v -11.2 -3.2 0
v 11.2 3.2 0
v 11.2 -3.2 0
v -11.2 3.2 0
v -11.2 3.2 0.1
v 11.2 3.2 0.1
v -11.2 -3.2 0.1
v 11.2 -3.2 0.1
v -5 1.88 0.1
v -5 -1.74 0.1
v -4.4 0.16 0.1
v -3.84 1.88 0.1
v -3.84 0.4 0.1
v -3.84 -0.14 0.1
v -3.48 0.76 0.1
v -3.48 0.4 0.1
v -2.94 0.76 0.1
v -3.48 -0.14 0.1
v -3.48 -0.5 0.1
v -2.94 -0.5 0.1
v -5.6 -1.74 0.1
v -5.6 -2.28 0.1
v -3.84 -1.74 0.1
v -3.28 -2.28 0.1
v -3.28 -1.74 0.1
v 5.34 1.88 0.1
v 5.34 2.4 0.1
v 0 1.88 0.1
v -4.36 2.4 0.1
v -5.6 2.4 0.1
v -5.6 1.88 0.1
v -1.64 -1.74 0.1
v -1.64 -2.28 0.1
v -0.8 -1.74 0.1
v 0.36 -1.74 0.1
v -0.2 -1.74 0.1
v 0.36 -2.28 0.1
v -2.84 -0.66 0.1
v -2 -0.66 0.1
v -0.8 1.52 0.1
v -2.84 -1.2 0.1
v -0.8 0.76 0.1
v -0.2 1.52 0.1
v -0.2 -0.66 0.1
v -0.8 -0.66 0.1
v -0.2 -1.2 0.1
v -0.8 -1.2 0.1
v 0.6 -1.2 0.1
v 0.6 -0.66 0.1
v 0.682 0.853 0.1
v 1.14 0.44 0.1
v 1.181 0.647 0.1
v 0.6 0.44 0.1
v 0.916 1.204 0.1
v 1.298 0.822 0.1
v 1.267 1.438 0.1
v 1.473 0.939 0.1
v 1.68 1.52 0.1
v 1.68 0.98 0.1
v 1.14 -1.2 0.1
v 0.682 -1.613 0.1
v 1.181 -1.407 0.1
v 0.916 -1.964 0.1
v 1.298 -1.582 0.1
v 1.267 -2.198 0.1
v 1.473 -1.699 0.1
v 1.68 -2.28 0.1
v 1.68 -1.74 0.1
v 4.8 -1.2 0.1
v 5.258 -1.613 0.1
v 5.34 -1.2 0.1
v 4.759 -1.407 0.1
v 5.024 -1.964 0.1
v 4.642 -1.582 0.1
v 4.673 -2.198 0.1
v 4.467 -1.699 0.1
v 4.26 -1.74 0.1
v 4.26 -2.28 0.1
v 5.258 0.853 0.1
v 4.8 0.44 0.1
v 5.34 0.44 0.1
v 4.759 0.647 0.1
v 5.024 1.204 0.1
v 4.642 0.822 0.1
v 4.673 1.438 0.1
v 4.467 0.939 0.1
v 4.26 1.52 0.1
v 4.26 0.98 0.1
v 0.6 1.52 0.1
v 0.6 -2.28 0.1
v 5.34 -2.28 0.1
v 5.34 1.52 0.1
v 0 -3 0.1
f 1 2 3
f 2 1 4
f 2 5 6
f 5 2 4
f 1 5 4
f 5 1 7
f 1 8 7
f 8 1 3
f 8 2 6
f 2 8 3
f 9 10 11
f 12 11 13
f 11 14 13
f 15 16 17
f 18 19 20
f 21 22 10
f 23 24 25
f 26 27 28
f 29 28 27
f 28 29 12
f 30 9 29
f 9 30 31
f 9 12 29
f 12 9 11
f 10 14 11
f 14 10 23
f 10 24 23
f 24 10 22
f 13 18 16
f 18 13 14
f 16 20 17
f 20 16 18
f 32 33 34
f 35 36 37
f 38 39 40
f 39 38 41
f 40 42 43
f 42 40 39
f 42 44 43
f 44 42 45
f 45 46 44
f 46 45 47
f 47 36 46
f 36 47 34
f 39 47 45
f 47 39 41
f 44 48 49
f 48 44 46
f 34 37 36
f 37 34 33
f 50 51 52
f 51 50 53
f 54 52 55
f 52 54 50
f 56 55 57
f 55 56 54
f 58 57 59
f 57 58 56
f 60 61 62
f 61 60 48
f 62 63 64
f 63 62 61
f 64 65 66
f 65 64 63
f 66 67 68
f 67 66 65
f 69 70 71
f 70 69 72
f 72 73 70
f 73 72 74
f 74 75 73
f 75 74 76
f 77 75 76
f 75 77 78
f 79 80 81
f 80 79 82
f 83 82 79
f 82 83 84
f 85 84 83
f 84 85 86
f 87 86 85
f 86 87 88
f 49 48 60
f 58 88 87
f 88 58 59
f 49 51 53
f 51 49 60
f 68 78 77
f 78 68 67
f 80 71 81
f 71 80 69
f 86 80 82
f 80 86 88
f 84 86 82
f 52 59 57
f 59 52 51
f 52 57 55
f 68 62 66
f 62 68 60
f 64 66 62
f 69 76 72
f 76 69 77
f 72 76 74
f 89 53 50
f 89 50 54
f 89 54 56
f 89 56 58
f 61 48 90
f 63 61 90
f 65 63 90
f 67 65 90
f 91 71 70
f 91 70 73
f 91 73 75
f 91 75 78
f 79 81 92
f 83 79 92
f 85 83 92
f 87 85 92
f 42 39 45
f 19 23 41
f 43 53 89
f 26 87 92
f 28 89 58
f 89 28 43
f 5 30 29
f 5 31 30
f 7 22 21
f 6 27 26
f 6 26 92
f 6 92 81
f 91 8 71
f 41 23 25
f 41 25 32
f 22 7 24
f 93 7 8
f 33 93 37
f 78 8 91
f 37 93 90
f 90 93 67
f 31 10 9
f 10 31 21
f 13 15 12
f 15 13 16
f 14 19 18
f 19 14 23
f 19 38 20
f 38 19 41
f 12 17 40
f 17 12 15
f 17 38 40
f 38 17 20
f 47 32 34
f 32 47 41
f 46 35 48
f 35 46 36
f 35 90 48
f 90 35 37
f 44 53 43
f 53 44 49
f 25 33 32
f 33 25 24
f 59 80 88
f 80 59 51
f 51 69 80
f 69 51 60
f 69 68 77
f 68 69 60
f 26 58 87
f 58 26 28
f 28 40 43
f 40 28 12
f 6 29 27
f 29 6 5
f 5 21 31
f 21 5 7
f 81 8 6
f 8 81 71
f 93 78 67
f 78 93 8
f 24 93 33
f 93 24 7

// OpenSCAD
// file: ../p/4-4edge.scad
use <../lib.scad>
$fa=1; $fs=0.2;
function ldraw_lib__4_4edge(realsolid=false) = [
// 0 Circle 1.0
// 0 Name: 4-4edge.dat
// 0 Author: James Jessiman
// 0 !LDRAW_ORG Primitive UPDATE 2017-01
// 0 !LICENSE Licensed under CC BY 2.0 and CC BY 4.0 : see CAreadme.txt
// 
// 0 BFC CERTIFY CCW
  [0,"BFC","CERTIFY"],
  [0,"BFC","CCW"],
// 
// 0 !HISTORY 1998-12-15 [PTadmin] Official Update 1998-10
// 0 !HISTORY 2005-12-28 [PTadmin] Official Update 2005-01
// 0 !HISTORY 2007-06-24 [PTadmin] Header formatted for Contributor Agreement
// 0 !HISTORY 2008-07-01 [PTadmin] Official Update 2008-01
// 0 !HISTORY 2017-01-15 [Steffen] BFCed
// 0 !HISTORY 2017-12-30 [PTadmin] Official Update 2017-01
// 
// 
// 2 24 1 0 0 0.9239 0 0.3827
  [2,24,1,0,0,0.9239,0,0.3827],
// 2 24 0.9239 0 0.3827 0.7071 0 0.7071
  [2,24,0.9239,0,0.3827,0.7071,0,0.7071],
// 2 24 0.7071 0 0.7071 0.3827 0 0.9239
  [2,24,0.7071,0,0.7071,0.3827,0,0.9239],
// 2 24 0.3827 0 0.9239 0 0 1
  [2,24,0.3827,0,0.9239,0,0,1],
// 2 24 0 0 1 -0.3827 0 0.9239
  [2,24,0,0,1,-0.3827,0,0.9239],
// 2 24 -0.3827 0 0.9239 -0.7071 0 0.7071
  [2,24,-0.3827,0,0.9239,-0.7071,0,0.7071],
// 2 24 -0.7071 0 0.7071 -0.9239 0 0.3827
  [2,24,-0.7071,0,0.7071,-0.9239,0,0.3827],
// 2 24 -0.9239 0 0.3827 -1 0 -0
  [2,24,-0.9239,0,0.3827,-1,0,-0],
// 2 24 -1 0 -0 -0.9239 0 -0.3827
  [2,24,-1,0,-0,-0.9239,0,-0.3827],
// 2 24 -0.9239 0 -0.3827 -0.7071 0 -0.7071
  [2,24,-0.9239,0,-0.3827,-0.7071,0,-0.7071],
// 2 24 -0.7071 0 -0.7071 -0.3827 0 -0.9239
  [2,24,-0.7071,0,-0.7071,-0.3827,0,-0.9239],
// 2 24 -0.3827 0 -0.9239 0 0 -1
  [2,24,-0.3827,0,-0.9239,0,0,-1],
// 2 24 0 0 -1 0.3827 0 -0.9239
  [2,24,0,0,-1,0.3827,0,-0.9239],
// 2 24 0.3827 0 -0.9239 0.7071 0 -0.7071
  [2,24,0.3827,0,-0.9239,0.7071,0,-0.7071],
// 2 24 0.7071 0 -0.7071 0.9239 0 -0.3827
  [2,24,0.7071,0,-0.7071,0.9239,0,-0.3827],
// 2 24 0.9239 0 -0.3827 1 0 0
  [2,24,0.9239,0,-0.3827,1,0,0],
];
module ldraw_lib__4_4edge(step=0, col=false, unit=2/5, alt=false, line=0.2, solid=!$preview)
    makepoly(ldraw_lib__4_4edge(solid), step=step, col=col, unit=unit, alt=alt, line=line, solid=solid);
ldraw_lib__4_4edge(line=0.2);
// file: ../p/4-4disc.scad
use <../lib.scad>
$fa=1; $fs=0.2;
function ldraw_lib__4_4disc(realsolid=false) = [
// 0 Disc 1.0
// 0 Name: 4-4disc.dat
// 0 Author: James Jessiman
// 0 !LDRAW_ORG Primitive UPDATE 2002-02
// 0 !LICENSE Licensed under CC BY 2.0 and CC BY 4.0 : see CAreadme.txt
// 
// 0 BFC CERTIFY CCW
  [0,"BFC","CERTIFY"],
  [0,"BFC","CCW"],
// 
// 0 !HISTORY 1998-12-15 [PTadmin] Official Update 1998-10
// 0 !HISTORY 2002-03-23 [sbliss] Added BFC statement
// 0 !HISTORY 2002-04-25 [PTadmin] Official Update 2002-02
// 0 !HISTORY 2007-06-24 [PTadmin] Header formatted for Contributor Agreement
// 0 !HISTORY 2008-07-01 [PTadmin] Official Update 2008-01
// 
// 
// 3 16 0 0 0 1 0 0 0.9239 0 0.3827
  [3,16,0,0,0,1,0,0,0.9239,0,0.3827],
// 3 16 0 0 0 0.9239 0 0.3827 0.7071 0 0.7071
  [3,16,0,0,0,0.9239,0,0.3827,0.7071,0,0.7071],
// 3 16 0 0 0 0.7071 0 0.7071 0.3827 0 0.9239
  [3,16,0,0,0,0.7071,0,0.7071,0.3827,0,0.9239],
// 3 16 0 0 0 0.3827 0 0.9239 0 0 1
  [3,16,0,0,0,0.3827,0,0.9239,0,0,1],
// 3 16 0 0 0 0 0 1 -0.3827 0 0.9239
  [3,16,0,0,0,0,0,1,-0.3827,0,0.9239],
// 3 16 0 0 0 -0.3827 0 0.9239 -0.7071 0 0.7071
  [3,16,0,0,0,-0.3827,0,0.9239,-0.7071,0,0.7071],
// 3 16 0 0 0 -0.7071 0 0.7071 -0.9239 0 0.3827
  [3,16,0,0,0,-0.7071,0,0.7071,-0.9239,0,0.3827],
// 3 16 0 0 0 -0.9239 0 0.3827 -1 0 -0
  [3,16,0,0,0,-0.9239,0,0.3827,-1,0,-0],
// 3 16 0 0 0 -1 0 -0 -0.9239 0 -0.3827
  [3,16,0,0,0,-1,0,-0,-0.9239,0,-0.3827],
// 3 16 0 0 0 -0.9239 0 -0.3827 -0.7071 0 -0.7071
  [3,16,0,0,0,-0.9239,0,-0.3827,-0.7071,0,-0.7071],
// 3 16 0 0 0 -0.7071 0 -0.7071 -0.3827 0 -0.9239
  [3,16,0,0,0,-0.7071,0,-0.7071,-0.3827,0,-0.9239],
// 3 16 0 0 0 -0.3827 0 -0.9239 0 0 -1
  [3,16,0,0,0,-0.3827,0,-0.9239,0,0,-1],
// 3 16 0 0 0 0 0 -1 0.3827 0 -0.9239
  [3,16,0,0,0,0,0,-1,0.3827,0,-0.9239],
// 3 16 0 0 0 0.3827 0 -0.9239 0.7071 0 -0.7071
  [3,16,0,0,0,0.3827,0,-0.9239,0.7071,0,-0.7071],
// 3 16 0 0 0 0.7071 0 -0.7071 0.9239 0 -0.3827
  [3,16,0,0,0,0.7071,0,-0.7071,0.9239,0,-0.3827],
// 3 16 0 0 0 0.9239 0 -0.3827 1 0 0
  [3,16,0,0,0,0.9239,0,-0.3827,1,0,0],
// 0
];
module ldraw_lib__4_4disc(step=0, col=false, unit=2/5, alt=false, line=0.2, solid=!$preview)
    makepoly(ldraw_lib__4_4disc(solid), step=step, col=col, unit=unit, alt=alt, line=line, solid=solid);
ldraw_lib__4_4disc(line=0.2);
// file: ../p/4-4cyli.scad
use <../lib.scad>
$fa=1; $fs=0.2;
function ldraw_lib__4_4cyli(realsolid=false) = [
// 0 Cylinder 1.0
// 0 Name: 4-4cyli.dat
// 0 Author: James Jessiman
// 0 !LDRAW_ORG Primitive UPDATE 2005-01
// 0 !LICENSE Licensed under CC BY 2.0 and CC BY 4.0 : see CAreadme.txt
// 
// 0 BFC CERTIFY CCW
  [0,"BFC","CERTIFY"],
  [0,"BFC","CCW"],
// 
// 0 !HISTORY 1998-12-15 [PTadmin] Official Update 1998-10
// 0 !HISTORY 2002-03-23 [sbliss] Added BFC statement; merged headers from files in distributions LDraw 0.27 and Complete.
// 0 !HISTORY 2002-04-25 [PTadmin] Official Update 2002-02
// 0 !HISTORY 2004-12-14 [guyvivan] BFC CCW
// 0 !HISTORY 2005-12-28 [PTadmin] Official Update 2005-01
// 0 !HISTORY 2007-06-24 [PTadmin] Header formatted for Contributor Agreement
// 0 !HISTORY 2008-07-01 [PTadmin] Official Update 2008-01
// 
// 
// 4 16 1 1 0 0.9239 1 0.3827 0.9239 0 0.3827 1 0 0
  [4,16,1,1,0,0.9239,1,0.3827,0.9239,0,0.3827,1,0,0],
// 5 24 1 0 0 1 1 0 0.9239 0 0.3827 0.9239 0 -0.3827
  [5,24,1,0,0,1,1,0,0.9239,0,0.3827,0.9239,0,-0.3827],
// 4 16 0.9239 1 0.3827 0.7071 1 0.7071 0.7071 0 0.7071 0.9239 0 0.3827
  [4,16,0.9239,1,0.3827,0.7071,1,0.7071,0.7071,0,0.7071,0.9239,0,0.3827],
// 5 24 0.9239 0 0.3827 0.9239 1 0.3827 0.7071 0 0.7071 1 0 0
  [5,24,0.9239,0,0.3827,0.9239,1,0.3827,0.7071,0,0.7071,1,0,0],
// 4 16 0.7071 1 0.7071 0.3827 1 0.9239 0.3827 0 0.9239 0.7071 0 0.7071
  [4,16,0.7071,1,0.7071,0.3827,1,0.9239,0.3827,0,0.9239,0.7071,0,0.7071],
// 5 24 0.7071 0 0.7071 0.7071 1 0.7071 0.3827 0 0.9239 0.9239 0 0.3827
  [5,24,0.7071,0,0.7071,0.7071,1,0.7071,0.3827,0,0.9239,0.9239,0,0.3827],
// 4 16 0.3827 1 0.9239 0 1 1 0 0 1 0.3827 0 0.9239
  [4,16,0.3827,1,0.9239,0,1,1,0,0,1,0.3827,0,0.9239],
// 5 24 0.3827 0 0.9239 0.3827 1 0.9239 0 0 1 0.7071 0 0.7071
  [5,24,0.3827,0,0.9239,0.3827,1,0.9239,0,0,1,0.7071,0,0.7071],
// 4 16 0 1 1 -0.3827 1 0.9239 -0.3827 0 0.9239 0 0 1
  [4,16,0,1,1,-0.3827,1,0.9239,-0.3827,0,0.9239,0,0,1],
// 5 24 0 0 1 0 1 1 -0.3827 0 0.9239 0.3827 0 0.9239
  [5,24,0,0,1,0,1,1,-0.3827,0,0.9239,0.3827,0,0.9239],
// 4 16 -0.3827 1 0.9239 -0.7071 1 0.7071 -0.7071 0 0.7071 -0.3827 0 0.9239
  [4,16,-0.3827,1,0.9239,-0.7071,1,0.7071,-0.7071,0,0.7071,-0.3827,0,0.9239],
// 5 24 -0.3827 0 0.9239 -0.3827 1 0.9239 -0.7071 0 0.7071 0 0 1
  [5,24,-0.3827,0,0.9239,-0.3827,1,0.9239,-0.7071,0,0.7071,0,0,1],
// 4 16 -0.7071 1 0.7071 -0.9239 1 0.3827 -0.9239 0 0.3827 -0.7071 0 0.7071
  [4,16,-0.7071,1,0.7071,-0.9239,1,0.3827,-0.9239,0,0.3827,-0.7071,0,0.7071],
// 5 24 -0.7071 0 0.7071 -0.7071 1 0.7071 -0.9239 0 0.3827 -0.3827 0 0.9239
  [5,24,-0.7071,0,0.7071,-0.7071,1,0.7071,-0.9239,0,0.3827,-0.3827,0,0.9239],
// 4 16 -0.9239 1 0.3827 -1 1 0 -1 0 0 -0.9239 0 0.3827
  [4,16,-0.9239,1,0.3827,-1,1,0,-1,0,0,-0.9239,0,0.3827],
// 5 24 -0.9239 0 0.3827 -0.9239 1 0.3827 -1 0 0 -0.7071 0 0.7071
  [5,24,-0.9239,0,0.3827,-0.9239,1,0.3827,-1,0,0,-0.7071,0,0.7071],
// 4 16 -1 1 0 -0.9239 1 -0.3827 -0.9239 0 -0.3827 -1 0 0
  [4,16,-1,1,0,-0.9239,1,-0.3827,-0.9239,0,-0.3827,-1,0,0],
// 5 24 -1 0 0 -1 1 0 -0.9239 0 -0.3827 -0.9239 0 0.3827
  [5,24,-1,0,0,-1,1,0,-0.9239,0,-0.3827,-0.9239,0,0.3827],
// 4 16 -0.9239 1 -0.3827 -0.7071 1 -0.7071 -0.7071 0 -0.7071 -0.9239 0 -0.3827
  [4,16,-0.9239,1,-0.3827,-0.7071,1,-0.7071,-0.7071,0,-0.7071,-0.9239,0,-0.3827],
// 5 24 -0.9239 0 -0.3827 -0.9239 1 -0.3827 -0.7071 0 -0.7071 -1 0 0
  [5,24,-0.9239,0,-0.3827,-0.9239,1,-0.3827,-0.7071,0,-0.7071,-1,0,0],
// 4 16 -0.7071 1 -0.7071 -0.3827 1 -0.9239 -0.3827 0 -0.9239 -0.7071 0 -0.7071
  [4,16,-0.7071,1,-0.7071,-0.3827,1,-0.9239,-0.3827,0,-0.9239,-0.7071,0,-0.7071],
// 5 24 -0.7071 0 -0.7071 -0.7071 1 -0.7071 -0.3827 0 -0.9239 -0.9239 0 -0.3827
  [5,24,-0.7071,0,-0.7071,-0.7071,1,-0.7071,-0.3827,0,-0.9239,-0.9239,0,-0.3827],
// 4 16 -0.3827 1 -0.9239 0 1 -1 0 0 -1 -0.3827 0 -0.9239
  [4,16,-0.3827,1,-0.9239,0,1,-1,0,0,-1,-0.3827,0,-0.9239],
// 5 24 -0.3827 0 -0.9239 -0.3827 1 -0.9239 0 0 -1 -0.7071 0 -0.7071
  [5,24,-0.3827,0,-0.9239,-0.3827,1,-0.9239,0,0,-1,-0.7071,0,-0.7071],
// 4 16 0 1 -1 0.3827 1 -0.9239 0.3827 0 -0.9239 0 0 -1
  [4,16,0,1,-1,0.3827,1,-0.9239,0.3827,0,-0.9239,0,0,-1],
// 5 24 0 0 -1 0 1 -1 0.3827 0 -0.9239 -0.3827 0 -0.9239
  [5,24,0,0,-1,0,1,-1,0.3827,0,-0.9239,-0.3827,0,-0.9239],
// 4 16 0.3827 1 -0.9239 0.7071 1 -0.7071 0.7071 0 -0.7071 0.3827 0 -0.9239
  [4,16,0.3827,1,-0.9239,0.7071,1,-0.7071,0.7071,0,-0.7071,0.3827,0,-0.9239],
// 5 24 0.3827 0 -0.9239 0.3827 1 -0.9239 0.7071 0 -0.7071 0 0 -1
  [5,24,0.3827,0,-0.9239,0.3827,1,-0.9239,0.7071,0,-0.7071,0,0,-1],
// 4 16 0.7071 1 -0.7071 0.9239 1 -0.3827 0.9239 0 -0.3827 0.7071 0 -0.7071
  [4,16,0.7071,1,-0.7071,0.9239,1,-0.3827,0.9239,0,-0.3827,0.7071,0,-0.7071],
// 5 24 0.7071 0 -0.7071 0.7071 1 -0.7071 0.9239 0 -0.3827 0.3827 0 -0.9239
  [5,24,0.7071,0,-0.7071,0.7071,1,-0.7071,0.9239,0,-0.3827,0.3827,0,-0.9239],
// 4 16 0.9239 1 -0.3827 1 1 0 1 0 0 0.9239 0 -0.3827
  [4,16,0.9239,1,-0.3827,1,1,0,1,0,0,0.9239,0,-0.3827],
// 5 24 0.9239 0 -0.3827 0.9239 1 -0.3827 1 0 0 0.7071 0 -0.7071
  [5,24,0.9239,0,-0.3827,0.9239,1,-0.3827,1,0,0,0.7071,0,-0.7071],
// 0
];
module ldraw_lib__4_4cyli(step=0, col=false, unit=2/5, alt=false, line=0.2, solid=!$preview)
    makepoly(ldraw_lib__4_4cyli(solid), step=step, col=col, unit=unit, alt=alt, line=line, solid=solid);
ldraw_lib__4_4cyli(line=0.2);
// file: ../p/stud3.scad
use <../lib.scad>
use <4-4cyli.scad>
use <4-4disc.scad>
use <4-4edge.scad>
$fa=1; $fs=0.2;
function ldraw_lib__stud3(realsolid=false) = realsolid ? 
    [openscad(translate([0,0,-eps()], o=cylinder(4+eps(), r=4)),2)] : [
// 0 Stud Tube Solid
// 0 Name: stud3.dat
// 0 Author: James Jessiman
// 0 !LDRAW_ORG Primitive UPDATE 2012-01
// 0 !LICENSE Licensed under CC BY 2.0 and CC BY 4.0 : see CAreadme.txt
// 
// 0 BFC CERTIFY CCW
  [0,"BFC","CERTIFY"],
  [0,"BFC","CCW"],
// 
// 0 !HISTORY 2002-04-04 [sbliss] Modified for BFC compliance
// 0 !HISTORY 2002-04-25 [PTadmin] Official Update 2002-02
// 0 !HISTORY 2007-06-24 [PTadmin] Header formatted for Contributor Agreement
// 0 !HISTORY 2008-07-01 [PTadmin] Official Update 2008-01
// 0 !HISTORY 2012-02-16 [Philo] Changed to CCW
// 0 !HISTORY 2012-03-30 [PTadmin] Official Update 2012-01
// 
// 
// 1 16 0 -4 0 4 0 0 0 1 0 0 0 4 4-4edge.dat
  [1,16,0,-4,0,4,0,0,0,1,0,0,0,4, ldraw_lib__4_4edge(realsolid)],
// 1 16 0 0 0 4 0 0 0 1 0 0 0 4 4-4edge.dat
  [1,16,0,0,0,4,0,0,0,1,0,0,0,4, ldraw_lib__4_4edge(realsolid)],
// 1 16 0 -4 0 4 0 0 0 1 0 0 0 4 4-4disc.dat
  [1,16,0,-4,0,4,0,0,0,1,0,0,0,4, ldraw_lib__4_4disc(realsolid)],
// 1 16 0 -4 0 4 0 0 0 4 0 0 0 4 4-4cyli.dat
  [1,16,0,-4,0,4,0,0,0,4,0,0,0,4, ldraw_lib__4_4cyli(realsolid)],
];
module ldraw_lib__stud3(step=0, col=false, unit=2/5, alt=false, line=0.2, solid=!$preview)
    makepoly(ldraw_lib__stud3(solid), step=step, col=col, unit=unit, alt=alt, line=line, solid=solid);
ldraw_lib__stud3(line=0.2);
// file: ../p/stud.scad
use <../lib.scad>
use <4-4cyli.scad>
use <4-4disc.scad>
use <4-4edge.scad>
$fa=1; $fs=0.2;
function ldraw_lib__stud(realsolid=false) = realsolid ? 
    [openscad(translate([0,0,-eps()], o=cylinder(4+eps(), r=6)),2)] : [
// 0 Stud
// 0 Name: stud.dat
// 0 Author: James Jessiman
// 0 !LDRAW_ORG Primitive UPDATE 2012-01
// 0 !LICENSE Licensed under CC BY 2.0 and CC BY 4.0 : see CAreadme.txt
// 
// 0 BFC CERTIFY CCW
  [0,"BFC","CERTIFY"],
  [0,"BFC","CCW"],
// 
// 0 !HISTORY 2002-04-04 [sbliss] Modified for BFC compliance
// 0 !HISTORY 2002-04-25 [PTadmin] Official Update 2002-02
// 0 !HISTORY 2007-06-24 [PTadmin] Header formatted for Contributor Agreement
// 0 !HISTORY 2008-07-01 [PTadmin] Official Update 2008-01
// 0 !HISTORY 2012-02-16 [Philo] Changed to CCW
// 0 !HISTORY 2012-03-30 [PTadmin] Official Update 2012-01
// 
// 
// 1 16 0 0 0 6 0 0 0 1 0 0 0 6 4-4edge.dat
  [1,16,0,0,0,6,0,0,0,1,0,0,0,6, ldraw_lib__4_4edge(realsolid)],
// 1 16 0 -4 0 6 0 0 0 1 0 0 0 6 4-4edge.dat
  [1,16,0,-4,0,6,0,0,0,1,0,0,0,6, ldraw_lib__4_4edge(realsolid)],
// 1 16 0 0 0 6 0 0 0 -4 0 0 0 6 4-4cyli.dat
  [1,16,0,0,0,6,0,0,0,-4,0,0,0,6, ldraw_lib__4_4cyli(realsolid)],
// 1 16 0 -4 0 6 0 0 0 1 0 0 0 6 4-4disc.dat
  [1,16,0,-4,0,6,0,0,0,1,0,0,0,6, ldraw_lib__4_4disc(realsolid)],
];
module ldraw_lib__stud(step=0, col=false, unit=2/5, alt=false, line=0.2, solid=!$preview)
    makepoly(ldraw_lib__stud(solid), step=step, col=col, unit=unit, alt=alt, line=line, solid=solid);
ldraw_lib__stud(line=0.2);
// file: ../p/box5.scad
use <../lib.scad>
$fa=1; $fs=0.2;
function ldraw_lib__box5(realsolid=false) = [
// 0 Box with 5 Faces and All Edges
// 0 Name: box5.dat
// 0 Author: James Jessiman
// 0 !LDRAW_ORG Primitive UPDATE 2012-01
// 0 !LICENSE Licensed under CC BY 2.0 and CC BY 4.0 : see CAreadme.txt
// 
// 0 BFC CERTIFY CCW
  [0,"BFC","CERTIFY"],
  [0,"BFC","CCW"],
// 
// 0 !HISTORY 2002-04-03 [sbliss] Modified for BFC compliance
// 0 !HISTORY 2002-04-25 [PTadmin] Official Update 2002-02
// 0 !HISTORY 2007-06-24 [PTadmin] Header formatted for Contributor Agreement
// 0 !HISTORY 2008-07-01 [PTadmin] Official Update 2008-01
// 0 !HISTORY 2012-02-16 [Philo] Changed to CCW
// 0 !HISTORY 2012-03-30 [PTadmin] Official Update 2012-01
// 
// 
// 2 24 1 1 1 -1 1 1
  [2,24,1,1,1,-1,1,1],
// 2 24 -1 1 1 -1 1 -1
  [2,24,-1,1,1,-1,1,-1],
// 2 24 -1 1 -1 1 1 -1
  [2,24,-1,1,-1,1,1,-1],
// 2 24 1 1 -1 1 1 1
  [2,24,1,1,-1,1,1,1],
// 2 24 1 0 1 -1 0 1
  [2,24,1,0,1,-1,0,1],
// 2 24 -1 0 1 -1 0 -1
  [2,24,-1,0,1,-1,0,-1],
// 2 24 -1 0 -1 1 0 -1
  [2,24,-1,0,-1,1,0,-1],
// 2 24 1 0 -1 1 0 1
  [2,24,1,0,-1,1,0,1],
// 2 24 1 0 1 1 1 1
  [2,24,1,0,1,1,1,1],
// 2 24 -1 0 1 -1 1 1
  [2,24,-1,0,1,-1,1,1],
// 2 24 1 0 -1 1 1 -1
  [2,24,1,0,-1,1,1,-1],
// 2 24 -1 0 -1 -1 1 -1
  [2,24,-1,0,-1,-1,1,-1],
// 4 16 -1 1 1 1 1 1 1 1 -1 -1 1 -1
  [4,16,-1,1,1,1,1,1,1,1,-1,-1,1,-1],
// 4 16 -1 1 1 -1 0 1 1 0 1 1 1 1
  [4,16,-1,1,1,-1,0,1,1,0,1,1,1,1],
// 4 16 -1 1 -1 -1 0 -1 -1 0 1 -1 1 1
  [4,16,-1,1,-1,-1,0,-1,-1,0,1,-1,1,1],
// 4 16 1 1 -1 1 0 -1 -1 0 -1 -1 1 -1
  [4,16,1,1,-1,1,0,-1,-1,0,-1,-1,1,-1],
// 4 16 1 1 1 1 0 1 1 0 -1 1 1 -1
  [4,16,1,1,1,1,0,1,1,0,-1,1,1,-1],
];
module ldraw_lib__box5(step=0, col=false, unit=2/5, alt=false, line=0.2, solid=!$preview)
    makepoly(ldraw_lib__box5(solid), step=step, col=col, unit=unit, alt=alt, line=line, solid=solid);
ldraw_lib__box5(line=0.2);
// file: ../p/box4t.scad
use <../lib.scad>
$fa=1; $fs=0.2;
function ldraw_lib__box4t(realsolid=false) = [
// 0 Box with 4 Adjacent Faces and All Edges
// 0 Name: box4t.dat
// 0 Author: Tore Eriksson [Tore_Eriksson]
// 0 !LDRAW_ORG Primitive UPDATE 2003-02
// 0 !LICENSE Licensed under CC BY 2.0 and CC BY 4.0 : see CAreadme.txt
// 
// 0 BFC CERTIFY CCW
  [0,"BFC","CERTIFY"],
  [0,"BFC","CCW"],
// 
// 0 !HISTORY 1997-09-29 [PTadmin] Official Update 1997-15
// 0 !HISTORY 2002-08-31 [izanette] Modified with WINDZ for BFC compliance
// 0 !HISTORY 2003-08-01 [PTadmin] Official Update 2003-02
// 0 !HISTORY 2007-06-24 [PTadmin] Header formatted for Contributor Agreement
// 0 !HISTORY 2008-07-01 [PTadmin] Official Update 2008-01
// 
// 
// 2 24 1 1 1 -1 1 1
  [2,24,1,1,1,-1,1,1],
// 2 24 -1 1 1 -1 1 -1
  [2,24,-1,1,1,-1,1,-1],
// 2 24 -1 1 -1 1 1 -1
  [2,24,-1,1,-1,1,1,-1],
// 2 24 1 1 -1 1 1 1
  [2,24,1,1,-1,1,1,1],
// 2 24 1 0 1 -1 0 1
  [2,24,1,0,1,-1,0,1],
// 2 24 -1 0 1 -1 0 -1
  [2,24,-1,0,1,-1,0,-1],
// 2 24 -1 0 -1 1 0 -1
  [2,24,-1,0,-1,1,0,-1],
// 2 24 1 0 -1 1 0 1
  [2,24,1,0,-1,1,0,1],
// 2 24 1 0 1 1 1 1
  [2,24,1,0,1,1,1,1],
// 2 24 -1 0 1 -1 1 1
  [2,24,-1,0,1,-1,1,1],
// 2 24 1 0 -1 1 1 -1
  [2,24,1,0,-1,1,1,-1],
// 2 24 -1 0 -1 -1 1 -1
  [2,24,-1,0,-1,-1,1,-1],
// 4 16 1 1 1 1 1 -1 -1 1 -1 -1 1 1
  [4,16,1,1,1,1,1,-1,-1,1,-1,-1,1,1],
// 4 16 1 1 1 -1 1 1 -1 0 1 1 0 1
  [4,16,1,1,1,-1,1,1,-1,0,1,1,0,1],
// 4 16 -1 1 1 -1 1 -1 -1 0 -1 -1 0 1
  [4,16,-1,1,1,-1,1,-1,-1,0,-1,-1,0,1],
// 0 4 16 -1 1 -1 -1 0 -1 1 0 -1 1 1 -1
// 4 16 1 1 -1 1 1 1 1 0 1 1 0 -1
  [4,16,1,1,-1,1,1,1,1,0,1,1,0,-1],
// 0
];
module ldraw_lib__box4t(step=0, col=false, unit=2/5, alt=false, line=0.2, solid=!$preview)
    makepoly(ldraw_lib__box4t(solid), step=step, col=col, unit=unit, alt=alt, line=line, solid=solid);
ldraw_lib__box4t(line=0.2);
// file: s/3004s01.scad
use <../../lib.scad>
use <../../p/box4t.scad>
use <../../p/box5.scad>
use <../../p/stud.scad>
use <../../p/stud3.scad>
$fa=1; $fs=0.2;
function ldraw_lib__s__3004s01(realsolid=false) = [
// 0 ~Brick  1 x  2 without Front Face
// 0 Name: s\3004s01.dat
// 0 Author: James Jessiman
// 0 !LDRAW_ORG Subpart UPDATE 2003-03
// 0 !LICENSE Licensed under CC BY 2.0 and CC BY 4.0 : see CAreadme.txt
// 
// 0 BFC CERTIFY CCW
  [0,"BFC","CERTIFY"],
  [0,"BFC","CCW"],
// 
// 0 !HISTORY 2003-09-07 [jriley] Subfiling, BFC
// 0 !HISTORY 2003-12-19 [PTadmin] Official Update 2003-03
// 0 !HISTORY 2007-08-29 [PTadmin] Header formatted for Contributor Agreement
// 0 !HISTORY 2008-07-01 [PTadmin] Official Update 2008-01
// 
// 
// 1 16 0 4 0 1 0 0 0 -5 0 0 0 1 stud3.dat
  [1,16,0,4,0,1,0,0,0,-5,0,0,0,1, ldraw_lib__stud3(realsolid)],
// 0 BFC INVERTNEXT
  [0,"BFC","INVERTNEXT"],
// 1 16 0 24 0 16 0 0 0 -20 0 0 0 6 box5.dat
  [1,16,0,24,0,16,0,0,0,-20,0,0,0,6, ldraw_lib__box5(realsolid)],
// 4 16 20 24 10 16 24 6 -16 24 6 -20 24 10
  [4,16,20,24,10,16,24,6,-16,24,6,-20,24,10],
// 4 16 -20 24 10 -16 24 6 -16 24 -6 -20 24 -10
  [4,16,-20,24,10,-16,24,6,-16,24,-6,-20,24,-10],
// 4 16 -20 24 -10 -16 24 -6 16 24 -6 20 24 -10
  [4,16,-20,24,-10,-16,24,-6,16,24,-6,20,24,-10],
// 4 16 20 24 -10 16 24 -6 16 24 6 20 24 10
  [4,16,20,24,-10,16,24,-6,16,24,6,20,24,10],
// 1 16 0 24 0 20 0 0 0 -24 0 0 0 10 box4t.dat
  [1,16,0,24,0,20,0,0,0,-24,0,0,0,10, ldraw_lib__box4t(realsolid)],
// 1 16 10 0 0 1 0 0 0 1 0 0 0 1 stud.dat
  [1,16,10,0,0,1,0,0,0,1,0,0,0,1, ldraw_lib__stud(realsolid)],
// 1 16 -10 0 0 1 0 0 0 1 0 0 0 1 stud.dat
  [1,16,-10,0,0,1,0,0,0,1,0,0,0,1, ldraw_lib__stud(realsolid)],
// 0
];
module ldraw_lib__s__3004s01(step=0, col=false, unit=2/5, alt=false, line=0.2, solid=!$preview)
    makepoly(ldraw_lib__s__3004s01(solid), step=step, col=col, unit=unit, alt=alt, line=line, solid=solid);
ldraw_lib__s__3004s01(line=0.2);
// file: 3004.scad
use <../lib.scad>
use <s/3004s01.scad>
$fa=1; $fs=0.2;
function ldraw_lib__3004(realsolid=false) = [
// 0 Brick  1 x  2
// 0 Name: 3004.dat
// 0 Author: James Jessiman
// 0 !LDRAW_ORG Part UPDATE 2022-05
// 0 !LICENSE Licensed under CC BY 2.0 and CC BY 4.0 : see CAreadme.txt
// 
// 0 BFC CERTIFY CCW
  [0,"BFC","CERTIFY"],
  [0,"BFC","CCW"],
// 
// 0 !HISTORY 2001-10-26 [PTadmin] Official Update 2001-01
// 0 !HISTORY 2002-05-07 {unknown} BFC Certification
// 0 !HISTORY 2002-06-11 [PTadmin] Official Update 2002-03
// 0 !HISTORY 2007-05-07 [PTadmin] Header formatted for Contributor Agreement
// 0 !HISTORY 2008-07-01 [PTadmin] Official Update 2008-01
// 0 !HISTORY 2022-08-04 [MagFors] Using subfile
// 0 !HISTORY 2022-09-15 [PTadmin] Official Update 2022-05
// 
// 
// 1 16 0 0 0 1 0 0 0 1 0 0 0 1 s\3004s01.dat
  [1,16,0,0,0,1,0,0,0,1,0,0,0,1, ldraw_lib__s__3004s01(realsolid)],
// 4 16 -20 24 -10 20 24 -10 20 0 -10 -20 0 -10
  [4,16,-20,24,-10,20,24,-10,20,0,-10,-20,0,-10],
];
module ldraw_lib__3004(step=0, col=false, unit=2/5, alt=false, line=0.2, solid=!$preview)
    makepoly(ldraw_lib__3004(solid), step=step, col=col, unit=unit, alt=alt, line=line, solid=solid);
ldraw_lib__3004(line=0.2);
// file: ../p/box5-12.scad
use <../lib.scad>
$fa=1; $fs=0.2;
function ldraw_lib__box5_12(realsolid=false) = [
// 0 Box with 5 Faces without Any Edges
// 0 Name: box5-12.dat
// 0 Author: Chris Dee [cwdee]
// 0 !LDRAW_ORG Primitive UPDATE 2009-02
// 0 !LICENSE Licensed under CC BY 2.0 and CC BY 4.0 : see CAreadme.txt
// 
// 0 BFC CERTIFY CCW
  [0,"BFC","CERTIFY"],
  [0,"BFC","CCW"],
// 
// 0 !HISTORY 2009-09-03 [PTadmin] Official Update 2009-02
// 
// 
// 4 16 1 1 1 1 1 -1 -1 1 -1 -1 1 1
  [4,16,1,1,1,1,1,-1,-1,1,-1,-1,1,1],
// 4 16 -1 0 1 1 0 1 1 1 1 -1 1 1
  [4,16,-1,0,1,1,0,1,1,1,1,-1,1,1],
// 4 16 -1 0 -1 -1 0 1 -1 1 1 -1 1 -1
  [4,16,-1,0,-1,-1,0,1,-1,1,1,-1,1,-1],
// 4 16 1 0 -1 -1 0 -1 -1 1 -1 1 1 -1
  [4,16,1,0,-1,-1,0,-1,-1,1,-1,1,1,-1],
// 4 16 1 0 1 1 0 -1 1 1 -1 1 1 1
  [4,16,1,0,1,1,0,-1,1,1,-1,1,1,1],
// 0
];
module ldraw_lib__box5_12(step=0, col=false, unit=2/5, alt=false, line=0.2, solid=!$preview)
    makepoly(ldraw_lib__box5_12(solid), step=step, col=col, unit=unit, alt=alt, line=line, solid=solid);
ldraw_lib__box5_12(line=0.2);
// file: ../p/1-4ring1.scad
use <../lib.scad>
$fa=1; $fs=0.2;
function ldraw_lib__1_4ring1(realsolid=false) = [
// 0 Ring  1 x 0.25
// 0 Name: 1-4ring1.dat
// 0 Author: Chris Dee [cwdee]
// 0 !LDRAW_ORG Primitive UPDATE 2012-01
// 0 !LICENSE Licensed under CC BY 2.0 and CC BY 4.0 : see CAreadme.txt
// 
// 0 BFC CERTIFY CCW
  [0,"BFC","CERTIFY"],
  [0,"BFC","CCW"],
// 
// 0 !HISTORY 2000-05-07 [PTadmin] Official Update 2000-01
// 0 !HISTORY 2002-11-22 [hafhead] Added BFC statement
// 0 !HISTORY 2002-11-30 [PTadmin] Official Update 2002-05
// 0 !HISTORY 2007-06-22 [PTadmin] Header formatted for Contributor Agreement
// 0 !HISTORY 2008-07-01 [PTadmin] Official Update 2008-01
// 0 !HISTORY 2012-02-16 [Philo] Changed to CCW
// 0 !HISTORY 2012-03-30 [PTadmin] Official Update 2012-01
// 
// 
// 4 16 2 0 0 1.8478 0 0.7654 0.9239 0 0.3827 1 0 0
  [4,16,2,0,0,1.8478,0,0.7654,0.9239,0,0.3827,1,0,0],
// 4 16 1.8478 0 0.7654 1.4142 0 1.4142 0.7071 0 0.7071 0.9239 0 0.3827
  [4,16,1.8478,0,0.7654,1.4142,0,1.4142,0.7071,0,0.7071,0.9239,0,0.3827],
// 4 16 1.4142 0 1.4142 0.7654 0 1.8478 0.3827 0 0.9239 0.7071 0 0.7071
  [4,16,1.4142,0,1.4142,0.7654,0,1.8478,0.3827,0,0.9239,0.7071,0,0.7071],
// 4 16 0.7654 0 1.8478 0 0 2 0 0 1 0.3827 0 0.9239
  [4,16,0.7654,0,1.8478,0,0,2,0,0,1,0.3827,0,0.9239],
];
module ldraw_lib__1_4ring1(step=0, col=false, unit=2/5, alt=false, line=0.2, solid=!$preview)
    makepoly(ldraw_lib__1_4ring1(solid), step=step, col=col, unit=unit, alt=alt, line=line, solid=solid);
ldraw_lib__1_4ring1(line=0.2);
// file: ../p/1-4ndis.scad
use <../lib.scad>
$fa=1; $fs=0.2;
function ldraw_lib__1_4ndis(realsolid=false) = [
// 0 Disc Negative 0.25
// 0 Name: 1-4ndis.dat
// 0 Author: James Jessiman
// 0 !LDRAW_ORG Primitive UPDATE 2012-01
// 0 !LICENSE Licensed under CC BY 2.0 and CC BY 4.0 : see CAreadme.txt
// 
// 0 BFC CERTIFY CCW
  [0,"BFC","CERTIFY"],
  [0,"BFC","CCW"],
// 
// 0 !HISTORY 2002-03-23 [sbliss] Added BFC Statement
// 0 !HISTORY 2002-04-25 [PTadmin] Official Update 2002-02
// 0 !HISTORY 2007-06-22 [PTadmin] Header formatted for Contributor Agreement
// 0 !HISTORY 2008-07-01 [PTadmin] Official Update 2008-01
// 0 !HISTORY 2012-02-16 [Philo] Changed to CCW
// 0 !HISTORY 2012-03-30 [PTadmin] Official Update 2012-01
// 
// 
// 3 16 0.9239 0 0.3827 1 0 0 1 0 1
  [3,16,0.9239,0,0.3827,1,0,0,1,0,1],
// 3 16 0.7071 0 0.7071 0.9239 0 0.3827 1 0 1
  [3,16,0.7071,0,0.7071,0.9239,0,0.3827,1,0,1],
// 3 16 0.3827 0 0.9239 0.7071 0 0.7071 1 0 1
  [3,16,0.3827,0,0.9239,0.7071,0,0.7071,1,0,1],
// 3 16 0 0 1 0.3827 0 0.9239 1 0 1
  [3,16,0,0,1,0.3827,0,0.9239,1,0,1],
];
module ldraw_lib__1_4ndis(step=0, col=false, unit=2/5, alt=false, line=0.2, solid=!$preview)
    makepoly(ldraw_lib__1_4ndis(solid), step=step, col=col, unit=unit, alt=alt, line=line, solid=solid);
ldraw_lib__1_4ndis(line=0.2);
// file: ../p/1-4chrd.scad
use <../lib.scad>
$fa=1; $fs=0.2;
function ldraw_lib__1_4chrd(realsolid=false) = [
// 0 Chord 0.25
// 0 Name: 1-4chrd.dat
// 0 Author: Tony Hafner [hafhead]
// 0 !LDRAW_ORG Primitive UPDATE 2012-02
// 0 !LICENSE Licensed under CC BY 2.0 and CC BY 4.0 : see CAreadme.txt
// 
// 0 BFC CERTIFY CCW
  [0,"BFC","CERTIFY"],
  [0,"BFC","CCW"],
// 
// 0 !HISTORY 2004-04-22 [PTadmin] Official Update 2004-02
// 0 !HISTORY 2007-10-09 [PTadmin] Header formatted for Contributor Agreement
// 0 !HISTORY 2008-07-01 [PTadmin] Official Update 2008-01
// 0 !HISTORY 2012-08-02 [MMR1988] Re-creation with PrimGen2 and Rectifier
// 0 !HISTORY 2012-08-09 [PTadmin] Official Update 2012-02
// 
// 
// 4 16 0.9239 0 0.3827 0.3827 0 0.9239 0 0 1 1 0 0
  [4,16,0.9239,0,0.3827,0.3827,0,0.9239,0,0,1,1,0,0],
// 3 16 0.7071 0 0.7071 0.3827 0 0.9239 0.9239 0 0.3827
  [3,16,0.7071,0,0.7071,0.3827,0,0.9239,0.9239,0,0.3827],
];
module ldraw_lib__1_4chrd(step=0, col=false, unit=2/5, alt=false, line=0.2, solid=!$preview)
    makepoly(ldraw_lib__1_4chrd(solid), step=step, col=col, unit=unit, alt=alt, line=line, solid=solid);
ldraw_lib__1_4chrd(line=0.2);
// main file
use <../lib.scad>
use <../p/1-4chrd.scad>
use <../p/1-4ndis.scad>
use <../p/1-4ring1.scad>
use <../p/box5-12.scad>
$fa=1; $fs=0.2;
function ldraw_lib__6112596e(realsolid=false) = [
// 0 Sticker  0.8 x  2.8 with "F40" on Yellow Background
// 0 Name: 6112596e.dat
// 0 Author: Bjoern Sigve Storesund [Storesund]
// 0 !LDRAW_ORG Part UPDATE 2017-01
// 0 !LICENSE Licensed under CC BY 2.0 and CC BY 4.0 : see CAreadme.txt
// 
// 0 BFC CERTIFY CCW
  [0,"BFC","CERTIFY"],
  [0,"BFC","CCW"],
// 
// 0 !KEYWORDS Ferrari, set 10248
// 
// 0 !HISTORY 2017-12-30 [PTadmin] Official Update 2017-01
// 
// 
// 1 16 0 -0.25 0 28 0 0 0 0.25 0 0 0 8 box5-12.dat
  [1,16,0,-0.25,0,28,0,0,0,0.25,0,0,0,8, ldraw_lib__box5_12(realsolid)],
// 0 // Black F
// 3 0 -12.5 -.25 4.7 -12.5 -.25 -4.35 -11 -.25 .4
  [3,0,-12.5,-.25,4.7,-12.5,-.25,-4.35,-11,-.25,.4],
// 3 0 -9.6 -.25 4.7 -11 -.25 .4 -9.6 -.25 1
  [3,0,-9.6,-.25,4.7,-11,-.25,.4,-9.6,-.25,1],
// 3 0 -11 -.25 .4 -9.6 -.25 -.35 -9.6 -.25 1
  [3,0,-11,-.25,.4,-9.6,-.25,-.35,-9.6,-.25,1],
// 3 0 -8.7 -.25 1.9 -8.7 -.25 1 -7.35 -.25 1.9
  [3,0,-8.7,-.25,1.9,-8.7,-.25,1,-7.35,-.25,1.9],
// 3 0 -8.7 -.25 -.35 -8.7 -.25 -1.25 -7.35 -.25 -1.25
  [3,0,-8.7,-.25,-.35,-8.7,-.25,-1.25,-7.35,-.25,-1.25],
// 3 0 -14 -.25 -4.35 -14 -.25 -5.7 -12.5 -.25 -4.35
  [3,0,-14,-.25,-4.35,-14,-.25,-5.7,-12.5,-.25,-4.35],
// 3 0 -9.6 -.25 -4.35 -8.2 -.25 -5.7 -8.2 -.25 -4.35
  [3,0,-9.6,-.25,-4.35,-8.2,-.25,-5.7,-8.2,-.25,-4.35],
// 3 0 13.35 -.25 4.7 13.35 -.25 6 0 -.25 4.7
  [3,0,13.35,-.25,4.7,13.35,-.25,6,0,-.25,4.7],
// 4 0 -10.9 -.25 6 -9.6 -.25 4.7 0 -.25 4.7 13.35 -.25 6
  [4,0,-10.9,-.25,6,-9.6,-.25,4.7,0,-.25,4.7,13.35,-.25,6],
// 4 0 -14 -.25 6 -14 -.25 4.7 -12.5 -.25 4.7 -10.9 -.25 6
  [4,0,-14,-.25,6,-14,-.25,4.7,-12.5,-.25,4.7,-10.9,-.25,6],
// 4 0 -9.6 -.25 4.7 -10.9 -.25 6 -12.5 -.25 4.7 -11 -.25 .4
  [4,0,-9.6,-.25,4.7,-10.9,-.25,6,-12.5,-.25,4.7,-11,-.25,.4],
// 4 0 -11 -.25 .4 -12.5 -.25 -4.35 -9.6 -.25 -4.35 -9.6 -.25 -.35
  [4,0,-11,-.25,.4,-12.5,-.25,-4.35,-9.6,-.25,-4.35,-9.6,-.25,-.35],
// 4 0 -12.5 -.25 -4.35 -14 -.25 -5.7 -8.2 -.25 -5.7 -9.6 -.25 -4.35
  [4,0,-12.5,-.25,-4.35,-14,-.25,-5.7,-8.2,-.25,-5.7,-9.6,-.25,-4.35],
// 4 0 -9.6 -.25 1 -9.6 -.25 -.35 -8.7 -.25 -.35 -8.7 -.25 1
  [4,0,-9.6,-.25,1,-9.6,-.25,-.35,-8.7,-.25,-.35,-8.7,-.25,1],
// 4 0 -8.7 -.25 1 -8.7 -.25 -.35 -7.35 -.25 -1.25 -7.35 -.25 1.9
  [4,0,-8.7,-.25,1,-8.7,-.25,-.35,-7.35,-.25,-1.25,-7.35,-.25,1.9],
// 0 // Black 4
// 3 0 -4.1 -.25 -4.35 -4.1 -.25 -5.7 -2 -.25 -4.35
  [3,0,-4.1,-.25,-4.35,-4.1,-.25,-5.7,-2,-.25,-4.35],
// 3 0 .9 -.25 -4.35 -.5 -.25 -4.35 .9 -.25 -5.7
  [3,0,.9,-.25,-4.35,-.5,-.25,-4.35,.9,-.25,-5.7],
// 4 0 -7.1 -.25 -1.65 -7.1 -.25 -3 -5 -.25 -1.65 -2 -.25 3.8
  [4,0,-7.1,-.25,-1.65,-7.1,-.25,-3,-5,-.25,-1.65,-2,-.25,3.8],
// 4 0 -2 -.25 3.8 -5 -.25 -1.65 -2 -.25 1.9 -.5 -.25 3.8
  [4,0,-2,-.25,3.8,-5,-.25,-1.65,-2,-.25,1.9,-.5,-.25,3.8],
// 4 0 -.5 -.25 -1.65 -.5 -.25 3.8 -2 -.25 1.9 -2 -.25 -1.65
  [4,0,-.5,-.25,-1.65,-.5,-.25,3.8,-2,-.25,1.9,-2,-.25,-1.65],
// 4 0 -.5 -.25 -3 -.5 -.25 -1.65 -2 -.25 -1.65 -2 -.25 -3
  [4,0,-.5,-.25,-3,-.5,-.25,-1.65,-2,-.25,-1.65,-2,-.25,-3],
// 4 0 -.5 -.25 -4.35 -.5 -.25 -3 -2 -.25 -3 -2 -.25 -4.35
  [4,0,-.5,-.25,-4.35,-.5,-.25,-3,-2,-.25,-3,-2,-.25,-4.35],
// 4 0 -2 -.25 -3 -2 -.25 -1.65 -5 -.25 -1.65 -7.1 -.25 -3
  [4,0,-2,-.25,-3,-2,-.25,-1.65,-5,-.25,-1.65,-7.1,-.25,-3],
// 4 0 -.5 -.25 -1.65 -.5 -.25 -3 1.5 -.25 -3 1.5 -.25 -1.65
  [4,0,-.5,-.25,-1.65,-.5,-.25,-3,1.5,-.25,-3,1.5,-.25,-1.65],
// 4 0 -2 -.25 -4.35 -4.1 -.25 -5.7 .9 -.25 -5.7 -.5 -.25 -4.35
  [4,0,-2,-.25,-4.35,-4.1,-.25,-5.7,.9,-.25,-5.7,-.5,-.25,-4.35],
// 0 // Black 0
// 1 0 4.2 -.25 1.1 -1.35 0 0 0 1 0 0 0 1.35 1-4ring1.dat
  [1,0,4.2,-.25,1.1,-1.35,0,0,0,1,0,0,0,1.35, ldraw_lib__1_4ring1(realsolid)],
// 1 0 4.2 -.25 -3 -1.35 0 0 0 1 0 0 0 -1.35 1-4ring1.dat
  [1,0,4.2,-.25,-3,-1.35,0,0,0,1,0,0,0,-1.35, ldraw_lib__1_4ring1(realsolid)],
// 1 0 10.65 -.25 -3 1.35 0 0 0 1 0 0 0 -1.35 1-4ring1.dat
  [1,0,10.65,-.25,-3,1.35,0,0,0,1,0,0,0,-1.35, ldraw_lib__1_4ring1(realsolid)],
// 1 0 10.65 -.25 1.1 1.35 0 0 0 1 0 0 0 1.35 1-4ring1.dat
  [1,0,10.65,-.25,1.1,1.35,0,0,0,1,0,0,0,1.35, ldraw_lib__1_4ring1(realsolid)],
// 3 0 1.5 -.25 -1.65 1.5 -.25 -3 2.85 -.25 -3
  [3,0,1.5,-.25,-1.65,1.5,-.25,-3,2.85,-.25,-3],
// 4 0 4.2 -.25 3.8 4.2 -.25 2.45 10.65 -.25 2.45 10.65 -.25 3.8
  [4,0,4.2,-.25,3.8,4.2,-.25,2.45,10.65,-.25,2.45,10.65,-.25,3.8],
// 4 0 1.5 -.25 1.1 1.5 -.25 -1.65 2.85 -.25 -3 2.85 -.25 1.1
  [4,0,1.5,-.25,1.1,1.5,-.25,-1.65,2.85,-.25,-3,2.85,-.25,1.1],
// 4 0 4.2 -.25 -4.35 4.2 -.25 -5.7 10.65 -.25 -5.7 10.65 -.25 -4.35
  [4,0,4.2,-.25,-4.35,4.2,-.25,-5.7,10.65,-.25,-5.7,10.65,-.25,-4.35],
// 4 0 12 -.25 1.1 12 -.25 -3 13.35 -.25 -3 13.35 -.25 1.1
  [4,0,12,-.25,1.1,12,-.25,-3,13.35,-.25,-3,13.35,-.25,1.1],
// 0 // Yellow top
// 1 14 10.65 -.25 1.1 1.35 0 0 0 1 0 0 0 1.35 1-4chrd.dat
  [1,14,10.65,-.25,1.1,1.35,0,0,0,1,0,0,0,1.35, ldraw_lib__1_4chrd(realsolid)],
// 1 14 4.2 -.25 1.1 -1.35 0 0 0 1 0 0 0 1.35 1-4chrd.dat
  [1,14,4.2,-.25,1.1,-1.35,0,0,0,1,0,0,0,1.35, ldraw_lib__1_4chrd(realsolid)],
// 1 14 4.2 -.25 -3 -1.35 0 0 0 1 0 0 0 -1.35 1-4chrd.dat
  [1,14,4.2,-.25,-3,-1.35,0,0,0,1,0,0,0,-1.35, ldraw_lib__1_4chrd(realsolid)],
// 1 14 10.65 -.25 -3 1.35 0 0 0 1 0 0 0 -1.35 1-4chrd.dat
  [1,14,10.65,-.25,-3,1.35,0,0,0,1,0,0,0,-1.35, ldraw_lib__1_4chrd(realsolid)],
// 1 14 4.2 -.25 1.1 -2.7 0 0 0 1 0 0 0 2.7 1-4ndis.dat
  [1,14,4.2,-.25,1.1,-2.7,0,0,0,1,0,0,0,2.7, ldraw_lib__1_4ndis(realsolid)],
// 1 14 4.2 -.25 -3 -2.7 0 0 0 1 0 0 0 -2.7 1-4ndis.dat
  [1,14,4.2,-.25,-3,-2.7,0,0,0,1,0,0,0,-2.7, ldraw_lib__1_4ndis(realsolid)],
// 1 14 10.65 -.25 -3 2.7 0 0 0 1 0 0 0 -2.7 1-4ndis.dat
  [1,14,10.65,-.25,-3,2.7,0,0,0,1,0,0,0,-2.7, ldraw_lib__1_4ndis(realsolid)],
// 1 14 10.65 -.25 1.1 2.7 0 0 0 1 0 0 0 2.7 1-4ndis.dat
  [1,14,10.65,-.25,1.1,2.7,0,0,0,1,0,0,0,2.7, ldraw_lib__1_4ndis(realsolid)],
// 3 14 -2 -.25 1.9 -5 -.25 -1.65 -2 -.25 -1.65
  [3,14,-2,-.25,1.9,-5,-.25,-1.65,-2,-.25,-1.65],
// 3 14 -8.7 -.25 -1.25 -9.6 -.25 -4.35 -7.1 -.25 -3
  [3,14,-8.7,-.25,-1.25,-9.6,-.25,-4.35,-7.1,-.25,-3],
// 3 14 -.5 -.25 3.8 1.5 -.25 1.1 1.5 -.25 3.8
  [3,14,-.5,-.25,3.8,1.5,-.25,1.1,1.5,-.25,3.8],
// 3 14 13.35 -.25 4.7 10.65 -.25 3.8 13.35 -.25 3.8
  [3,14,13.35,-.25,4.7,10.65,-.25,3.8,13.35,-.25,3.8],
// 3 14 0 -.25 4.7 1.5 -.25 3.8 4.2 -.25 3.8
  [3,14,0,-.25,4.7,1.5,-.25,3.8,4.2,-.25,3.8],
// 3 14 1.5 -.25 3.8 0 -.25 4.7 -.5 -.25 3.8
  [3,14,1.5,-.25,3.8,0,-.25,4.7,-.5,-.25,3.8],
// 3 14 -28 -.25 8 -14 -.25 6 -10.9 -.25 6
  [3,14,-28,-.25,8,-14,-.25,6,-10.9,-.25,6],
// 3 14 -28 -.25 8 -14 -.25 4.7 -14 -.25 6
  [3,14,-28,-.25,8,-14,-.25,4.7,-14,-.25,6],
// 3 14 -28 -.25 -8 -14 -.25 -5.7 -14 -.25 -4.35
  [3,14,-28,-.25,-8,-14,-.25,-5.7,-14,-.25,-4.35],
// 3 14 28 -.25 8 13.35 -.25 6 13.35 -.25 4.7
  [3,14,28,-.25,8,13.35,-.25,6,13.35,-.25,4.7],
// 3 14 28 -.25 8 13.35 -.25 4.7 13.35 -.25 3.8
  [3,14,28,-.25,8,13.35,-.25,4.7,13.35,-.25,3.8],
// 3 14 28 -.25 8 13.35 -.25 3.8 13.35 -.25 1.1
  [3,14,28,-.25,8,13.35,-.25,3.8,13.35,-.25,1.1],
// 3 14 13.35 -.25 -5.7 28 -.25 -8 13.35 -.25 -3
  [3,14,13.35,-.25,-5.7,28,-.25,-8,13.35,-.25,-3],
// 3 14 -7.1 -.25 -3 -9.6 -.25 -4.35 -8.2 -.25 -4.35
  [3,14,-7.1,-.25,-3,-9.6,-.25,-4.35,-8.2,-.25,-4.35],
// 3 14 -7.1 -.25 -3 -8.2 -.25 -4.35 -4.1 -.25 -4.35
  [3,14,-7.1,-.25,-3,-8.2,-.25,-4.35,-4.1,-.25,-4.35],
// 3 14 -14 -.25 -5.7 -28 -.25 -8 -8.2 -.25 -5.7
  [3,14,-14,-.25,-5.7,-28,-.25,-8,-8.2,-.25,-5.7],
// 3 14 0 -.25 -7.5 -28 -.25 -8 28 -.25 -8
  [3,14,0,-.25,-7.5,-28,-.25,-8,28,-.25,-8],
// 3 14 -4.1 -.25 -5.7 0 -.25 -7.5 .9 -.25 -5.7
  [3,14,-4.1,-.25,-5.7,0,-.25,-7.5,.9,-.25,-5.7],
// 3 14 10.65 -.25 -5.7 28 -.25 -8 13.35 -.25 -5.7
  [3,14,10.65,-.25,-5.7,28,-.25,-8,13.35,-.25,-5.7],
// 3 14 .9 -.25 -5.7 0 -.25 -7.5 1.5 -.25 -5.7
  [3,14,.9,-.25,-5.7,0,-.25,-7.5,1.5,-.25,-5.7],
// 3 14 1.5 -.25 -5.7 0 -.25 -7.5 4.2 -.25 -5.7
  [3,14,1.5,-.25,-5.7,0,-.25,-7.5,4.2,-.25,-5.7],
// 4 14 -14 -.25 4.7 -14 -.25 -4.35 -12.5 -.25 -4.35 -12.5 -.25 4.7
  [4,14,-14,-.25,4.7,-14,-.25,-4.35,-12.5,-.25,-4.35,-12.5,-.25,4.7],
// 4 14 -9.6 -.25 4.7 -9.6 -.25 1 -8.7 -.25 1 -8.7 -.25 1.9
  [4,14,-9.6,-.25,4.7,-9.6,-.25,1,-8.7,-.25,1,-8.7,-.25,1.9],
// 4 14 -9.6 -.25 -.35 -9.6 -.25 -4.35 -8.7 -.25 -1.25 -8.7 -.25 -.35
  [4,14,-9.6,-.25,-.35,-9.6,-.25,-4.35,-8.7,-.25,-1.25,-8.7,-.25,-.35],
// 4 14 -8.7 -.25 -1.25 -7.1 -.25 -3 -7.1 -.25 -1.65 -7.35 -.25 -1.25
  [4,14,-8.7,-.25,-1.25,-7.1,-.25,-3,-7.1,-.25,-1.65,-7.35,-.25,-1.25],
// 4 14 -9.6 -.25 4.7 -8.7 -.25 1.9 -7.35 -.25 1.9 -2 -.25 3.8
  [4,14,-9.6,-.25,4.7,-8.7,-.25,1.9,-7.35,-.25,1.9,-2,-.25,3.8],
// 4 14 -7.35 -.25 1.9 -7.35 -.25 -1.25 -7.1 -.25 -1.65 -2 -.25 3.8
  [4,14,-7.35,-.25,1.9,-7.35,-.25,-1.25,-7.1,-.25,-1.65,-2,-.25,3.8],
// 4 14 -7.1 -.25 -3 -4.1 -.25 -4.35 -2 -.25 -4.35 -2 -.25 -3
  [4,14,-7.1,-.25,-3,-4.1,-.25,-4.35,-2,-.25,-4.35,-2,-.25,-3],
// 4 14 -.5 -.25 -3 -.5 -.25 -4.35 .9 -.25 -4.35 1.5 -.25 -3
  [4,14,-.5,-.25,-3,-.5,-.25,-4.35,.9,-.25,-4.35,1.5,-.25,-3],
// 4 14 .9 -.25 -4.35 .9 -.25 -5.7 1.5 -.25 -5.7 1.5 -.25 -3
  [4,14,.9,-.25,-4.35,.9,-.25,-5.7,1.5,-.25,-5.7,1.5,-.25,-3],
// 4 14 -.5 -.25 3.8 -.5 -.25 -1.65 1.5 -.25 -1.65 1.5 -.25 1.1
  [4,14,-.5,-.25,3.8,-.5,-.25,-1.65,1.5,-.25,-1.65,1.5,-.25,1.1],
// 4 14 -8.2 -.25 -4.35 -8.2 -.25 -5.7 -4.1 -.25 -5.7 -4.1 -.25 -4.35
  [4,14,-8.2,-.25,-4.35,-8.2,-.25,-5.7,-4.1,-.25,-5.7,-4.1,-.25,-4.35],
// 4 14 4.2 -.25 2.45 2.85 -.25 1.1 12 -.25 1.1 10.65 -.25 2.45
  [4,14,4.2,-.25,2.45,2.85,-.25,1.1,12,-.25,1.1,10.65,-.25,2.45],
// 4 14 2.85 -.25 1.1 2.85 -.25 -3 12 -.25 -3 12 -.25 1.1
  [4,14,2.85,-.25,1.1,2.85,-.25,-3,12,-.25,-3,12,-.25,1.1],
// 4 14 2.85 -.25 -3 4.2 -.25 -4.35 10.65 -.25 -4.35 12 -.25 -3
  [4,14,2.85,-.25,-3,4.2,-.25,-4.35,10.65,-.25,-4.35,12,-.25,-3],
// 4 14 0 -.25 4.7 4.2 -.25 3.8 10.65 -.25 3.8 13.35 -.25 4.7
  [4,14,0,-.25,4.7,4.2,-.25,3.8,10.65,-.25,3.8,13.35,-.25,4.7],
// 4 14 -9.6 -.25 4.7 -2 -.25 3.8 -.5 -.25 3.8 0 -.25 4.7
  [4,14,-9.6,-.25,4.7,-2,-.25,3.8,-.5,-.25,3.8,0,-.25,4.7],
// 4 14 -28 -.25 8 -10.9 -.25 6 13.35 -.25 6 28 -.25 8
  [4,14,-28,-.25,8,-10.9,-.25,6,13.35,-.25,6,28,-.25,8],
// 4 14 -28 -.25 8 -28 -.25 -8 -14 -.25 -4.35 -14 -.25 4.7
  [4,14,-28,-.25,8,-28,-.25,-8,-14,-.25,-4.35,-14,-.25,4.7],
// 4 14 13.35 -.25 1.1 13.35 -.25 -3 28 -.25 -8 28 -.25 8
  [4,14,13.35,-.25,1.1,13.35,-.25,-3,28,-.25,-8,28,-.25,8],
// 4 14 4.2 -.25 -5.7 0 -.25 -7.5 28 -.25 -8 10.65 -.25 -5.7
  [4,14,4.2,-.25,-5.7,0,-.25,-7.5,28,-.25,-8,10.65,-.25,-5.7],
// 4 14 -28 -.25 -8 0 -.25 -7.5 -4.1 -.25 -5.7 -8.2 -.25 -5.7
  [4,14,-28,-.25,-8,0,-.25,-7.5,-4.1,-.25,-5.7,-8.2,-.25,-5.7],
];
module ldraw_lib__6112596e(step=0, col=false, unit=2/5, alt=false, line=0.2, solid=!$preview)
    makepoly(ldraw_lib__6112596e(solid), step=step, col=col, unit=unit, alt=alt, line=line, solid=solid);
ldraw_lib__6112596e(line=0.2);
